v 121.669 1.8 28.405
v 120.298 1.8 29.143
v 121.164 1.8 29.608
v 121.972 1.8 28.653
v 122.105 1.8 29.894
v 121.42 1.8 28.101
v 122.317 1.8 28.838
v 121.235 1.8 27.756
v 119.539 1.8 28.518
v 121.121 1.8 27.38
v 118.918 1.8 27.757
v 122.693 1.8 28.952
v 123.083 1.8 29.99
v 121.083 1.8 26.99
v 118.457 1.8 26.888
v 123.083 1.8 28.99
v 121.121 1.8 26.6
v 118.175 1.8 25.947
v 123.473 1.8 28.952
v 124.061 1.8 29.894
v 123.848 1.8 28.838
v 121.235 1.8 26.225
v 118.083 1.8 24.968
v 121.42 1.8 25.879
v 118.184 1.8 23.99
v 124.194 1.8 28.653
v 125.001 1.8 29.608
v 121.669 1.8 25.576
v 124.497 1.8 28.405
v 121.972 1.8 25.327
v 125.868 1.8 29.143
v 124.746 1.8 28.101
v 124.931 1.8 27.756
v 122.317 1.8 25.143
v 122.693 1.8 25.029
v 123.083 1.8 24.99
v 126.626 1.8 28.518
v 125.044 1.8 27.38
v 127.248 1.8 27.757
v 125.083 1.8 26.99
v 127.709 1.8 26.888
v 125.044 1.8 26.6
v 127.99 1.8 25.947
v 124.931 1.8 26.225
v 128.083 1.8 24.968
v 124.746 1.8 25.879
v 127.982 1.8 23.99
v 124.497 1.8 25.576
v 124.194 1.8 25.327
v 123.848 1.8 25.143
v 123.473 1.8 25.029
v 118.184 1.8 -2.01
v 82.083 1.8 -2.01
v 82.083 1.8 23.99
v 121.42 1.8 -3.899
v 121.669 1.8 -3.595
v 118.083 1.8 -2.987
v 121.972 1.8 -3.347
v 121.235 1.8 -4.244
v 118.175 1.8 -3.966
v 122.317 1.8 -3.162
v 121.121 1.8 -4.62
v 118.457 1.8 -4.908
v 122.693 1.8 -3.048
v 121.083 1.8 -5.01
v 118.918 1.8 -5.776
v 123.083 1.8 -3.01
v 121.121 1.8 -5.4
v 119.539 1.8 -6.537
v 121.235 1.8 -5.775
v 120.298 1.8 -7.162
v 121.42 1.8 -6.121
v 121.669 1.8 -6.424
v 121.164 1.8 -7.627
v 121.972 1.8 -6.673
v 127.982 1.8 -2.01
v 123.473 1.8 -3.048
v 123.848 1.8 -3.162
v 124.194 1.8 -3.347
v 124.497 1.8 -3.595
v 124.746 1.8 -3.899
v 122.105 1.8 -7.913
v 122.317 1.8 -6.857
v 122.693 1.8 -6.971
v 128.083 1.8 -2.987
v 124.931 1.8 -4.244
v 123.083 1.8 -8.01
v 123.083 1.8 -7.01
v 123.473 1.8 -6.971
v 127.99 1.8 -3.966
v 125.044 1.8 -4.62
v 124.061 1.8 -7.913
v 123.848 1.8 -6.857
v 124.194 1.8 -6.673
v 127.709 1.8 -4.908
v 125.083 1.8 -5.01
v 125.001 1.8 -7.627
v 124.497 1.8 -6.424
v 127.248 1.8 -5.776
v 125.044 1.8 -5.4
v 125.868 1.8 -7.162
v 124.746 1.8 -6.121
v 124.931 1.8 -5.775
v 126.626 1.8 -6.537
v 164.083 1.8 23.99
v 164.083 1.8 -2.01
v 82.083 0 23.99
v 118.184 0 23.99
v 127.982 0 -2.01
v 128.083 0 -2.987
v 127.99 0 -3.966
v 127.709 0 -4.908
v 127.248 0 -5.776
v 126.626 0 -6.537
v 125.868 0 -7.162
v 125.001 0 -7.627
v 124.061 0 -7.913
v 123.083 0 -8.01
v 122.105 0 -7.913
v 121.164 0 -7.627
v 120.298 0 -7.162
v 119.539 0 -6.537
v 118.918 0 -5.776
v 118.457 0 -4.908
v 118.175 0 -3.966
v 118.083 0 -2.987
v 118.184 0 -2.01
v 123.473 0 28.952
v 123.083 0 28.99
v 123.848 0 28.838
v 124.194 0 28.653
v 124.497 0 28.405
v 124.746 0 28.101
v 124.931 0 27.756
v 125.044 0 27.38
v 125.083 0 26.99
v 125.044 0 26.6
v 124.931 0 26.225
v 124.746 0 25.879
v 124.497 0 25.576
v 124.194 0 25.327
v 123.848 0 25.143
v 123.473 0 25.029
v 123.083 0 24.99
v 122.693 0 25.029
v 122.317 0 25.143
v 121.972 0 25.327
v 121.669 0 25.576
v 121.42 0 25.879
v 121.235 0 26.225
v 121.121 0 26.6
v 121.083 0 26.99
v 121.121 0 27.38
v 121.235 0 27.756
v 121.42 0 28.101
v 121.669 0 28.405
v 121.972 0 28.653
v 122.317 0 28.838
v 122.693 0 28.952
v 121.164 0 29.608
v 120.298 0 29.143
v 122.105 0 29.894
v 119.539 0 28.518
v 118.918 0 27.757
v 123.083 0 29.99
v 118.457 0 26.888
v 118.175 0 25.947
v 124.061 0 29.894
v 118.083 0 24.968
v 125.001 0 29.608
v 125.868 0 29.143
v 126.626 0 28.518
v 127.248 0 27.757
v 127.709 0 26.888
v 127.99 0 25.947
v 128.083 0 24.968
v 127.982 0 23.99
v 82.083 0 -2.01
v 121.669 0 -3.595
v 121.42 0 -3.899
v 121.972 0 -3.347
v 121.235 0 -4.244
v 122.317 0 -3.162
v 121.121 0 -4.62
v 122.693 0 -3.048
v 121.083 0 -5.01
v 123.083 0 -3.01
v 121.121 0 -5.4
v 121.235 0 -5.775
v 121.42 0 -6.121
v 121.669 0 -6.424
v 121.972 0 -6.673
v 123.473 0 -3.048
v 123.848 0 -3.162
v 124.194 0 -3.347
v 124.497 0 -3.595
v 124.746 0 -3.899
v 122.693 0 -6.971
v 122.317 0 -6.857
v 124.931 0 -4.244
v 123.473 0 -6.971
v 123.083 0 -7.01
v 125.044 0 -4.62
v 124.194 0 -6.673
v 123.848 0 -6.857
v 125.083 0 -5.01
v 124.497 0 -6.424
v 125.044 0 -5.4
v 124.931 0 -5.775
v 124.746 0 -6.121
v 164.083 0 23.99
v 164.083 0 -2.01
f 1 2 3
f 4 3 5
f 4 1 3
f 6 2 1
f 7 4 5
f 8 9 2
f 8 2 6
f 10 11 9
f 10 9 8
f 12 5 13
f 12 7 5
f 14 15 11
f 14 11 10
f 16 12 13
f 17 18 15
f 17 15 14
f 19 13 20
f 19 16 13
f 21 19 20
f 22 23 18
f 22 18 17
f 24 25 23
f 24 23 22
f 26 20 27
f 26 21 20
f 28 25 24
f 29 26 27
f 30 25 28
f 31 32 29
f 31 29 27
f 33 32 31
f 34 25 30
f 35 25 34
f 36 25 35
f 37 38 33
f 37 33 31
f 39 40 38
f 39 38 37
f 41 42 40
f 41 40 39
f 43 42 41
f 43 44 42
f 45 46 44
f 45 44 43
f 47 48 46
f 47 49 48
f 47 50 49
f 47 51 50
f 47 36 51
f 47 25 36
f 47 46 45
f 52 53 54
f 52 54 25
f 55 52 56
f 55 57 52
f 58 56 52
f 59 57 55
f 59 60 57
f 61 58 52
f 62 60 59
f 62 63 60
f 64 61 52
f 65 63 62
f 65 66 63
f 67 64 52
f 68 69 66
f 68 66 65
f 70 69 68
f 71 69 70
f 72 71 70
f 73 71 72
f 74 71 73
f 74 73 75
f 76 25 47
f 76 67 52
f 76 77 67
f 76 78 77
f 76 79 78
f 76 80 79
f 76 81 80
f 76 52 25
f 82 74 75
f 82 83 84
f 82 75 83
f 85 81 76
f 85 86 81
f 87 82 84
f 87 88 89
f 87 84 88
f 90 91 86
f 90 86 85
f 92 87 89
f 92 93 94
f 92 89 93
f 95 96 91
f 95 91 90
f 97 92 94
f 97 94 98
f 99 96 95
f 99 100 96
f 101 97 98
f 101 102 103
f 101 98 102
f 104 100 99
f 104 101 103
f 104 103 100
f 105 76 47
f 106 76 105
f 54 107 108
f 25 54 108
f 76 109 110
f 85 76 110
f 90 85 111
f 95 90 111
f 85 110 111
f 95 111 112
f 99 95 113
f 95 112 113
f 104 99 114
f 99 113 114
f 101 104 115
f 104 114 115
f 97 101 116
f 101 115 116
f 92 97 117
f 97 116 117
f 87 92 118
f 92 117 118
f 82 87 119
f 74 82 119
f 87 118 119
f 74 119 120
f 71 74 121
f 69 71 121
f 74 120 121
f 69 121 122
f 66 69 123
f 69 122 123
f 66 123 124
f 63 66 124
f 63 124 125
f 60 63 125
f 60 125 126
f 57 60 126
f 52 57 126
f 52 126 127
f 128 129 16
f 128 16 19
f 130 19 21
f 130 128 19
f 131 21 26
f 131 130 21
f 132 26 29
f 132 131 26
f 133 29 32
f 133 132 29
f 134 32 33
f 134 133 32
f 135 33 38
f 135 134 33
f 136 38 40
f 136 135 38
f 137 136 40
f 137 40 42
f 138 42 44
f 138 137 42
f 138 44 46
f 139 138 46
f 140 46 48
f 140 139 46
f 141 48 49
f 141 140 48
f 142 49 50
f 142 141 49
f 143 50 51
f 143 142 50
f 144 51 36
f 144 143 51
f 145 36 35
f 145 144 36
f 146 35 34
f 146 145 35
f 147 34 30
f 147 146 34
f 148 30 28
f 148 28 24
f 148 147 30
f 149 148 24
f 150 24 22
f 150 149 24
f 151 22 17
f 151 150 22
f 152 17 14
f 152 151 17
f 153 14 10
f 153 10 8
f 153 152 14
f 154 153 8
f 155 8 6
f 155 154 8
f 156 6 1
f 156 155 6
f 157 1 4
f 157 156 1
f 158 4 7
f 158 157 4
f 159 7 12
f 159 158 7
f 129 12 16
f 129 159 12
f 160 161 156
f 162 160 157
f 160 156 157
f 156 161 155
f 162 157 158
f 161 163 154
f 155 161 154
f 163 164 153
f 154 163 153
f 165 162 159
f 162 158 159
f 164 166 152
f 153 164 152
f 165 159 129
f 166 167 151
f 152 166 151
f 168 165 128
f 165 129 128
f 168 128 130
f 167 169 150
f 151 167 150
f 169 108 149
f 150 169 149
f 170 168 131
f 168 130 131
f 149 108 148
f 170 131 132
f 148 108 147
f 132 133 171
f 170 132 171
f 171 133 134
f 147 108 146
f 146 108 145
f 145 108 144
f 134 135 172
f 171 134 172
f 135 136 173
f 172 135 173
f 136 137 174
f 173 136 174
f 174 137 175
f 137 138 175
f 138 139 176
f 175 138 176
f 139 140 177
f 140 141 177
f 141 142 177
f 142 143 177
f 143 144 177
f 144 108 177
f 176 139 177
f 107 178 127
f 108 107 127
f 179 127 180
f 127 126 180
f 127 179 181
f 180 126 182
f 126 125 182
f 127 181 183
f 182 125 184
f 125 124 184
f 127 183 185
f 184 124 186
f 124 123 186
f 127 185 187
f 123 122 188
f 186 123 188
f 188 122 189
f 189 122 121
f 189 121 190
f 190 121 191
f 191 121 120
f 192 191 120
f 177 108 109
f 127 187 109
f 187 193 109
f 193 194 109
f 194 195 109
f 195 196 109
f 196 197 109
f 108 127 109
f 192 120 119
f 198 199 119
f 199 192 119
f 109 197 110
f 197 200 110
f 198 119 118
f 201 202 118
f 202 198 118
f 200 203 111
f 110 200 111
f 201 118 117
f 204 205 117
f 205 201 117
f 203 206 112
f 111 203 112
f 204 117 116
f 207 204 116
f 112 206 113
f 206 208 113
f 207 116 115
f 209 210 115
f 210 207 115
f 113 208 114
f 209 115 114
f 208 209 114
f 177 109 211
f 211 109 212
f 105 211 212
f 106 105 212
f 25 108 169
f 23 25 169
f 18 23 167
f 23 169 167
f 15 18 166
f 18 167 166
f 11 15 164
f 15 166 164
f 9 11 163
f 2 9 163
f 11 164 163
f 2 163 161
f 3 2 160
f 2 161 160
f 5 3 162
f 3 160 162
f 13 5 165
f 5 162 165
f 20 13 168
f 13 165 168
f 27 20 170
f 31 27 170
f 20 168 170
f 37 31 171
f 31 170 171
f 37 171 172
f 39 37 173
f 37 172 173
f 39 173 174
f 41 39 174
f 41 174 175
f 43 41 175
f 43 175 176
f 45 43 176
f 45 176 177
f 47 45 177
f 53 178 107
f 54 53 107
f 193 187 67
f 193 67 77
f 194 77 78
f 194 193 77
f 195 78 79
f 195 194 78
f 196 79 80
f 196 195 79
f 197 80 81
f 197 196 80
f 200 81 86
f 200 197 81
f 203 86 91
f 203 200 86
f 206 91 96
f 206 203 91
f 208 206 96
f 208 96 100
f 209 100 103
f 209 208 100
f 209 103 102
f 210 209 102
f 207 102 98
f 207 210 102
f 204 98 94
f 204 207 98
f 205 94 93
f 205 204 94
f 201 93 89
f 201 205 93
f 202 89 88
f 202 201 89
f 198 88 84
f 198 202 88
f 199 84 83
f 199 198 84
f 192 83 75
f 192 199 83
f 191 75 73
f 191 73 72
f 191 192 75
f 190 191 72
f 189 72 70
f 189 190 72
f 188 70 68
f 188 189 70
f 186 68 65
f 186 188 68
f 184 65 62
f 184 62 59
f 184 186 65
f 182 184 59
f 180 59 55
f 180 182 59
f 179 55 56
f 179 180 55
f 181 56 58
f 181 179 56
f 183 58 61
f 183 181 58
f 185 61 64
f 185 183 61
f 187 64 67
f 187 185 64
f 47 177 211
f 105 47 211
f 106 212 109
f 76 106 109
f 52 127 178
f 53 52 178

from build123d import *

# Parameters (mm, degrees)
SKETCH1_R           = 2
BOSS_EXTRUDE1_DEPTH = 1.8


with BuildPart() as part:
    # Sketch1 → Boss-Extrude1 (new body)
    with BuildSketch(Plane(origin=(0, 0, 0), x_dir=(1, 0, 0), z_dir=(0, 1, 0))):
        with BuildLine():
            Line((118.18380357, 2.009694076), (82.082783055, 2.009694076))
            Line((82.082783055, 2.009694076), (82.082783055, -23.990305924))
            Line((82.082783055, -23.990305924), (118.18380357, -23.990305924))
            ThreePointArc((118.18380357, -23.990305924), (123.082783055, -29.990305924), (127.981762541, -23.990305924))
            Line((127.981762541, -23.990305924), (164.082783055, -23.990305924))
            Line((164.082783055, -23.990305924), (164.082783055, 2.009694076))
            Line((164.082783055, 2.009694076), (127.981762541, 2.009694076))
            ThreePointArc((127.981762541, 2.009694076), (123.082783055, 8.009694076), (118.18380357, 2.009694076))
        make_face()
        with Locations(Location((123.082783055, 5.009694076, 0), (0, 0, 270))):
            Circle(SKETCH1_R, mode=Mode.SUBTRACT)
        with Locations(Location((123.082783055, -26.990305924, 0), (0, 0, 270))):
            Circle(SKETCH1_R, mode=Mode.SUBTRACT)
    extrude(amount=BOSS_EXTRUDE1_DEPTH)


solid = part.part
